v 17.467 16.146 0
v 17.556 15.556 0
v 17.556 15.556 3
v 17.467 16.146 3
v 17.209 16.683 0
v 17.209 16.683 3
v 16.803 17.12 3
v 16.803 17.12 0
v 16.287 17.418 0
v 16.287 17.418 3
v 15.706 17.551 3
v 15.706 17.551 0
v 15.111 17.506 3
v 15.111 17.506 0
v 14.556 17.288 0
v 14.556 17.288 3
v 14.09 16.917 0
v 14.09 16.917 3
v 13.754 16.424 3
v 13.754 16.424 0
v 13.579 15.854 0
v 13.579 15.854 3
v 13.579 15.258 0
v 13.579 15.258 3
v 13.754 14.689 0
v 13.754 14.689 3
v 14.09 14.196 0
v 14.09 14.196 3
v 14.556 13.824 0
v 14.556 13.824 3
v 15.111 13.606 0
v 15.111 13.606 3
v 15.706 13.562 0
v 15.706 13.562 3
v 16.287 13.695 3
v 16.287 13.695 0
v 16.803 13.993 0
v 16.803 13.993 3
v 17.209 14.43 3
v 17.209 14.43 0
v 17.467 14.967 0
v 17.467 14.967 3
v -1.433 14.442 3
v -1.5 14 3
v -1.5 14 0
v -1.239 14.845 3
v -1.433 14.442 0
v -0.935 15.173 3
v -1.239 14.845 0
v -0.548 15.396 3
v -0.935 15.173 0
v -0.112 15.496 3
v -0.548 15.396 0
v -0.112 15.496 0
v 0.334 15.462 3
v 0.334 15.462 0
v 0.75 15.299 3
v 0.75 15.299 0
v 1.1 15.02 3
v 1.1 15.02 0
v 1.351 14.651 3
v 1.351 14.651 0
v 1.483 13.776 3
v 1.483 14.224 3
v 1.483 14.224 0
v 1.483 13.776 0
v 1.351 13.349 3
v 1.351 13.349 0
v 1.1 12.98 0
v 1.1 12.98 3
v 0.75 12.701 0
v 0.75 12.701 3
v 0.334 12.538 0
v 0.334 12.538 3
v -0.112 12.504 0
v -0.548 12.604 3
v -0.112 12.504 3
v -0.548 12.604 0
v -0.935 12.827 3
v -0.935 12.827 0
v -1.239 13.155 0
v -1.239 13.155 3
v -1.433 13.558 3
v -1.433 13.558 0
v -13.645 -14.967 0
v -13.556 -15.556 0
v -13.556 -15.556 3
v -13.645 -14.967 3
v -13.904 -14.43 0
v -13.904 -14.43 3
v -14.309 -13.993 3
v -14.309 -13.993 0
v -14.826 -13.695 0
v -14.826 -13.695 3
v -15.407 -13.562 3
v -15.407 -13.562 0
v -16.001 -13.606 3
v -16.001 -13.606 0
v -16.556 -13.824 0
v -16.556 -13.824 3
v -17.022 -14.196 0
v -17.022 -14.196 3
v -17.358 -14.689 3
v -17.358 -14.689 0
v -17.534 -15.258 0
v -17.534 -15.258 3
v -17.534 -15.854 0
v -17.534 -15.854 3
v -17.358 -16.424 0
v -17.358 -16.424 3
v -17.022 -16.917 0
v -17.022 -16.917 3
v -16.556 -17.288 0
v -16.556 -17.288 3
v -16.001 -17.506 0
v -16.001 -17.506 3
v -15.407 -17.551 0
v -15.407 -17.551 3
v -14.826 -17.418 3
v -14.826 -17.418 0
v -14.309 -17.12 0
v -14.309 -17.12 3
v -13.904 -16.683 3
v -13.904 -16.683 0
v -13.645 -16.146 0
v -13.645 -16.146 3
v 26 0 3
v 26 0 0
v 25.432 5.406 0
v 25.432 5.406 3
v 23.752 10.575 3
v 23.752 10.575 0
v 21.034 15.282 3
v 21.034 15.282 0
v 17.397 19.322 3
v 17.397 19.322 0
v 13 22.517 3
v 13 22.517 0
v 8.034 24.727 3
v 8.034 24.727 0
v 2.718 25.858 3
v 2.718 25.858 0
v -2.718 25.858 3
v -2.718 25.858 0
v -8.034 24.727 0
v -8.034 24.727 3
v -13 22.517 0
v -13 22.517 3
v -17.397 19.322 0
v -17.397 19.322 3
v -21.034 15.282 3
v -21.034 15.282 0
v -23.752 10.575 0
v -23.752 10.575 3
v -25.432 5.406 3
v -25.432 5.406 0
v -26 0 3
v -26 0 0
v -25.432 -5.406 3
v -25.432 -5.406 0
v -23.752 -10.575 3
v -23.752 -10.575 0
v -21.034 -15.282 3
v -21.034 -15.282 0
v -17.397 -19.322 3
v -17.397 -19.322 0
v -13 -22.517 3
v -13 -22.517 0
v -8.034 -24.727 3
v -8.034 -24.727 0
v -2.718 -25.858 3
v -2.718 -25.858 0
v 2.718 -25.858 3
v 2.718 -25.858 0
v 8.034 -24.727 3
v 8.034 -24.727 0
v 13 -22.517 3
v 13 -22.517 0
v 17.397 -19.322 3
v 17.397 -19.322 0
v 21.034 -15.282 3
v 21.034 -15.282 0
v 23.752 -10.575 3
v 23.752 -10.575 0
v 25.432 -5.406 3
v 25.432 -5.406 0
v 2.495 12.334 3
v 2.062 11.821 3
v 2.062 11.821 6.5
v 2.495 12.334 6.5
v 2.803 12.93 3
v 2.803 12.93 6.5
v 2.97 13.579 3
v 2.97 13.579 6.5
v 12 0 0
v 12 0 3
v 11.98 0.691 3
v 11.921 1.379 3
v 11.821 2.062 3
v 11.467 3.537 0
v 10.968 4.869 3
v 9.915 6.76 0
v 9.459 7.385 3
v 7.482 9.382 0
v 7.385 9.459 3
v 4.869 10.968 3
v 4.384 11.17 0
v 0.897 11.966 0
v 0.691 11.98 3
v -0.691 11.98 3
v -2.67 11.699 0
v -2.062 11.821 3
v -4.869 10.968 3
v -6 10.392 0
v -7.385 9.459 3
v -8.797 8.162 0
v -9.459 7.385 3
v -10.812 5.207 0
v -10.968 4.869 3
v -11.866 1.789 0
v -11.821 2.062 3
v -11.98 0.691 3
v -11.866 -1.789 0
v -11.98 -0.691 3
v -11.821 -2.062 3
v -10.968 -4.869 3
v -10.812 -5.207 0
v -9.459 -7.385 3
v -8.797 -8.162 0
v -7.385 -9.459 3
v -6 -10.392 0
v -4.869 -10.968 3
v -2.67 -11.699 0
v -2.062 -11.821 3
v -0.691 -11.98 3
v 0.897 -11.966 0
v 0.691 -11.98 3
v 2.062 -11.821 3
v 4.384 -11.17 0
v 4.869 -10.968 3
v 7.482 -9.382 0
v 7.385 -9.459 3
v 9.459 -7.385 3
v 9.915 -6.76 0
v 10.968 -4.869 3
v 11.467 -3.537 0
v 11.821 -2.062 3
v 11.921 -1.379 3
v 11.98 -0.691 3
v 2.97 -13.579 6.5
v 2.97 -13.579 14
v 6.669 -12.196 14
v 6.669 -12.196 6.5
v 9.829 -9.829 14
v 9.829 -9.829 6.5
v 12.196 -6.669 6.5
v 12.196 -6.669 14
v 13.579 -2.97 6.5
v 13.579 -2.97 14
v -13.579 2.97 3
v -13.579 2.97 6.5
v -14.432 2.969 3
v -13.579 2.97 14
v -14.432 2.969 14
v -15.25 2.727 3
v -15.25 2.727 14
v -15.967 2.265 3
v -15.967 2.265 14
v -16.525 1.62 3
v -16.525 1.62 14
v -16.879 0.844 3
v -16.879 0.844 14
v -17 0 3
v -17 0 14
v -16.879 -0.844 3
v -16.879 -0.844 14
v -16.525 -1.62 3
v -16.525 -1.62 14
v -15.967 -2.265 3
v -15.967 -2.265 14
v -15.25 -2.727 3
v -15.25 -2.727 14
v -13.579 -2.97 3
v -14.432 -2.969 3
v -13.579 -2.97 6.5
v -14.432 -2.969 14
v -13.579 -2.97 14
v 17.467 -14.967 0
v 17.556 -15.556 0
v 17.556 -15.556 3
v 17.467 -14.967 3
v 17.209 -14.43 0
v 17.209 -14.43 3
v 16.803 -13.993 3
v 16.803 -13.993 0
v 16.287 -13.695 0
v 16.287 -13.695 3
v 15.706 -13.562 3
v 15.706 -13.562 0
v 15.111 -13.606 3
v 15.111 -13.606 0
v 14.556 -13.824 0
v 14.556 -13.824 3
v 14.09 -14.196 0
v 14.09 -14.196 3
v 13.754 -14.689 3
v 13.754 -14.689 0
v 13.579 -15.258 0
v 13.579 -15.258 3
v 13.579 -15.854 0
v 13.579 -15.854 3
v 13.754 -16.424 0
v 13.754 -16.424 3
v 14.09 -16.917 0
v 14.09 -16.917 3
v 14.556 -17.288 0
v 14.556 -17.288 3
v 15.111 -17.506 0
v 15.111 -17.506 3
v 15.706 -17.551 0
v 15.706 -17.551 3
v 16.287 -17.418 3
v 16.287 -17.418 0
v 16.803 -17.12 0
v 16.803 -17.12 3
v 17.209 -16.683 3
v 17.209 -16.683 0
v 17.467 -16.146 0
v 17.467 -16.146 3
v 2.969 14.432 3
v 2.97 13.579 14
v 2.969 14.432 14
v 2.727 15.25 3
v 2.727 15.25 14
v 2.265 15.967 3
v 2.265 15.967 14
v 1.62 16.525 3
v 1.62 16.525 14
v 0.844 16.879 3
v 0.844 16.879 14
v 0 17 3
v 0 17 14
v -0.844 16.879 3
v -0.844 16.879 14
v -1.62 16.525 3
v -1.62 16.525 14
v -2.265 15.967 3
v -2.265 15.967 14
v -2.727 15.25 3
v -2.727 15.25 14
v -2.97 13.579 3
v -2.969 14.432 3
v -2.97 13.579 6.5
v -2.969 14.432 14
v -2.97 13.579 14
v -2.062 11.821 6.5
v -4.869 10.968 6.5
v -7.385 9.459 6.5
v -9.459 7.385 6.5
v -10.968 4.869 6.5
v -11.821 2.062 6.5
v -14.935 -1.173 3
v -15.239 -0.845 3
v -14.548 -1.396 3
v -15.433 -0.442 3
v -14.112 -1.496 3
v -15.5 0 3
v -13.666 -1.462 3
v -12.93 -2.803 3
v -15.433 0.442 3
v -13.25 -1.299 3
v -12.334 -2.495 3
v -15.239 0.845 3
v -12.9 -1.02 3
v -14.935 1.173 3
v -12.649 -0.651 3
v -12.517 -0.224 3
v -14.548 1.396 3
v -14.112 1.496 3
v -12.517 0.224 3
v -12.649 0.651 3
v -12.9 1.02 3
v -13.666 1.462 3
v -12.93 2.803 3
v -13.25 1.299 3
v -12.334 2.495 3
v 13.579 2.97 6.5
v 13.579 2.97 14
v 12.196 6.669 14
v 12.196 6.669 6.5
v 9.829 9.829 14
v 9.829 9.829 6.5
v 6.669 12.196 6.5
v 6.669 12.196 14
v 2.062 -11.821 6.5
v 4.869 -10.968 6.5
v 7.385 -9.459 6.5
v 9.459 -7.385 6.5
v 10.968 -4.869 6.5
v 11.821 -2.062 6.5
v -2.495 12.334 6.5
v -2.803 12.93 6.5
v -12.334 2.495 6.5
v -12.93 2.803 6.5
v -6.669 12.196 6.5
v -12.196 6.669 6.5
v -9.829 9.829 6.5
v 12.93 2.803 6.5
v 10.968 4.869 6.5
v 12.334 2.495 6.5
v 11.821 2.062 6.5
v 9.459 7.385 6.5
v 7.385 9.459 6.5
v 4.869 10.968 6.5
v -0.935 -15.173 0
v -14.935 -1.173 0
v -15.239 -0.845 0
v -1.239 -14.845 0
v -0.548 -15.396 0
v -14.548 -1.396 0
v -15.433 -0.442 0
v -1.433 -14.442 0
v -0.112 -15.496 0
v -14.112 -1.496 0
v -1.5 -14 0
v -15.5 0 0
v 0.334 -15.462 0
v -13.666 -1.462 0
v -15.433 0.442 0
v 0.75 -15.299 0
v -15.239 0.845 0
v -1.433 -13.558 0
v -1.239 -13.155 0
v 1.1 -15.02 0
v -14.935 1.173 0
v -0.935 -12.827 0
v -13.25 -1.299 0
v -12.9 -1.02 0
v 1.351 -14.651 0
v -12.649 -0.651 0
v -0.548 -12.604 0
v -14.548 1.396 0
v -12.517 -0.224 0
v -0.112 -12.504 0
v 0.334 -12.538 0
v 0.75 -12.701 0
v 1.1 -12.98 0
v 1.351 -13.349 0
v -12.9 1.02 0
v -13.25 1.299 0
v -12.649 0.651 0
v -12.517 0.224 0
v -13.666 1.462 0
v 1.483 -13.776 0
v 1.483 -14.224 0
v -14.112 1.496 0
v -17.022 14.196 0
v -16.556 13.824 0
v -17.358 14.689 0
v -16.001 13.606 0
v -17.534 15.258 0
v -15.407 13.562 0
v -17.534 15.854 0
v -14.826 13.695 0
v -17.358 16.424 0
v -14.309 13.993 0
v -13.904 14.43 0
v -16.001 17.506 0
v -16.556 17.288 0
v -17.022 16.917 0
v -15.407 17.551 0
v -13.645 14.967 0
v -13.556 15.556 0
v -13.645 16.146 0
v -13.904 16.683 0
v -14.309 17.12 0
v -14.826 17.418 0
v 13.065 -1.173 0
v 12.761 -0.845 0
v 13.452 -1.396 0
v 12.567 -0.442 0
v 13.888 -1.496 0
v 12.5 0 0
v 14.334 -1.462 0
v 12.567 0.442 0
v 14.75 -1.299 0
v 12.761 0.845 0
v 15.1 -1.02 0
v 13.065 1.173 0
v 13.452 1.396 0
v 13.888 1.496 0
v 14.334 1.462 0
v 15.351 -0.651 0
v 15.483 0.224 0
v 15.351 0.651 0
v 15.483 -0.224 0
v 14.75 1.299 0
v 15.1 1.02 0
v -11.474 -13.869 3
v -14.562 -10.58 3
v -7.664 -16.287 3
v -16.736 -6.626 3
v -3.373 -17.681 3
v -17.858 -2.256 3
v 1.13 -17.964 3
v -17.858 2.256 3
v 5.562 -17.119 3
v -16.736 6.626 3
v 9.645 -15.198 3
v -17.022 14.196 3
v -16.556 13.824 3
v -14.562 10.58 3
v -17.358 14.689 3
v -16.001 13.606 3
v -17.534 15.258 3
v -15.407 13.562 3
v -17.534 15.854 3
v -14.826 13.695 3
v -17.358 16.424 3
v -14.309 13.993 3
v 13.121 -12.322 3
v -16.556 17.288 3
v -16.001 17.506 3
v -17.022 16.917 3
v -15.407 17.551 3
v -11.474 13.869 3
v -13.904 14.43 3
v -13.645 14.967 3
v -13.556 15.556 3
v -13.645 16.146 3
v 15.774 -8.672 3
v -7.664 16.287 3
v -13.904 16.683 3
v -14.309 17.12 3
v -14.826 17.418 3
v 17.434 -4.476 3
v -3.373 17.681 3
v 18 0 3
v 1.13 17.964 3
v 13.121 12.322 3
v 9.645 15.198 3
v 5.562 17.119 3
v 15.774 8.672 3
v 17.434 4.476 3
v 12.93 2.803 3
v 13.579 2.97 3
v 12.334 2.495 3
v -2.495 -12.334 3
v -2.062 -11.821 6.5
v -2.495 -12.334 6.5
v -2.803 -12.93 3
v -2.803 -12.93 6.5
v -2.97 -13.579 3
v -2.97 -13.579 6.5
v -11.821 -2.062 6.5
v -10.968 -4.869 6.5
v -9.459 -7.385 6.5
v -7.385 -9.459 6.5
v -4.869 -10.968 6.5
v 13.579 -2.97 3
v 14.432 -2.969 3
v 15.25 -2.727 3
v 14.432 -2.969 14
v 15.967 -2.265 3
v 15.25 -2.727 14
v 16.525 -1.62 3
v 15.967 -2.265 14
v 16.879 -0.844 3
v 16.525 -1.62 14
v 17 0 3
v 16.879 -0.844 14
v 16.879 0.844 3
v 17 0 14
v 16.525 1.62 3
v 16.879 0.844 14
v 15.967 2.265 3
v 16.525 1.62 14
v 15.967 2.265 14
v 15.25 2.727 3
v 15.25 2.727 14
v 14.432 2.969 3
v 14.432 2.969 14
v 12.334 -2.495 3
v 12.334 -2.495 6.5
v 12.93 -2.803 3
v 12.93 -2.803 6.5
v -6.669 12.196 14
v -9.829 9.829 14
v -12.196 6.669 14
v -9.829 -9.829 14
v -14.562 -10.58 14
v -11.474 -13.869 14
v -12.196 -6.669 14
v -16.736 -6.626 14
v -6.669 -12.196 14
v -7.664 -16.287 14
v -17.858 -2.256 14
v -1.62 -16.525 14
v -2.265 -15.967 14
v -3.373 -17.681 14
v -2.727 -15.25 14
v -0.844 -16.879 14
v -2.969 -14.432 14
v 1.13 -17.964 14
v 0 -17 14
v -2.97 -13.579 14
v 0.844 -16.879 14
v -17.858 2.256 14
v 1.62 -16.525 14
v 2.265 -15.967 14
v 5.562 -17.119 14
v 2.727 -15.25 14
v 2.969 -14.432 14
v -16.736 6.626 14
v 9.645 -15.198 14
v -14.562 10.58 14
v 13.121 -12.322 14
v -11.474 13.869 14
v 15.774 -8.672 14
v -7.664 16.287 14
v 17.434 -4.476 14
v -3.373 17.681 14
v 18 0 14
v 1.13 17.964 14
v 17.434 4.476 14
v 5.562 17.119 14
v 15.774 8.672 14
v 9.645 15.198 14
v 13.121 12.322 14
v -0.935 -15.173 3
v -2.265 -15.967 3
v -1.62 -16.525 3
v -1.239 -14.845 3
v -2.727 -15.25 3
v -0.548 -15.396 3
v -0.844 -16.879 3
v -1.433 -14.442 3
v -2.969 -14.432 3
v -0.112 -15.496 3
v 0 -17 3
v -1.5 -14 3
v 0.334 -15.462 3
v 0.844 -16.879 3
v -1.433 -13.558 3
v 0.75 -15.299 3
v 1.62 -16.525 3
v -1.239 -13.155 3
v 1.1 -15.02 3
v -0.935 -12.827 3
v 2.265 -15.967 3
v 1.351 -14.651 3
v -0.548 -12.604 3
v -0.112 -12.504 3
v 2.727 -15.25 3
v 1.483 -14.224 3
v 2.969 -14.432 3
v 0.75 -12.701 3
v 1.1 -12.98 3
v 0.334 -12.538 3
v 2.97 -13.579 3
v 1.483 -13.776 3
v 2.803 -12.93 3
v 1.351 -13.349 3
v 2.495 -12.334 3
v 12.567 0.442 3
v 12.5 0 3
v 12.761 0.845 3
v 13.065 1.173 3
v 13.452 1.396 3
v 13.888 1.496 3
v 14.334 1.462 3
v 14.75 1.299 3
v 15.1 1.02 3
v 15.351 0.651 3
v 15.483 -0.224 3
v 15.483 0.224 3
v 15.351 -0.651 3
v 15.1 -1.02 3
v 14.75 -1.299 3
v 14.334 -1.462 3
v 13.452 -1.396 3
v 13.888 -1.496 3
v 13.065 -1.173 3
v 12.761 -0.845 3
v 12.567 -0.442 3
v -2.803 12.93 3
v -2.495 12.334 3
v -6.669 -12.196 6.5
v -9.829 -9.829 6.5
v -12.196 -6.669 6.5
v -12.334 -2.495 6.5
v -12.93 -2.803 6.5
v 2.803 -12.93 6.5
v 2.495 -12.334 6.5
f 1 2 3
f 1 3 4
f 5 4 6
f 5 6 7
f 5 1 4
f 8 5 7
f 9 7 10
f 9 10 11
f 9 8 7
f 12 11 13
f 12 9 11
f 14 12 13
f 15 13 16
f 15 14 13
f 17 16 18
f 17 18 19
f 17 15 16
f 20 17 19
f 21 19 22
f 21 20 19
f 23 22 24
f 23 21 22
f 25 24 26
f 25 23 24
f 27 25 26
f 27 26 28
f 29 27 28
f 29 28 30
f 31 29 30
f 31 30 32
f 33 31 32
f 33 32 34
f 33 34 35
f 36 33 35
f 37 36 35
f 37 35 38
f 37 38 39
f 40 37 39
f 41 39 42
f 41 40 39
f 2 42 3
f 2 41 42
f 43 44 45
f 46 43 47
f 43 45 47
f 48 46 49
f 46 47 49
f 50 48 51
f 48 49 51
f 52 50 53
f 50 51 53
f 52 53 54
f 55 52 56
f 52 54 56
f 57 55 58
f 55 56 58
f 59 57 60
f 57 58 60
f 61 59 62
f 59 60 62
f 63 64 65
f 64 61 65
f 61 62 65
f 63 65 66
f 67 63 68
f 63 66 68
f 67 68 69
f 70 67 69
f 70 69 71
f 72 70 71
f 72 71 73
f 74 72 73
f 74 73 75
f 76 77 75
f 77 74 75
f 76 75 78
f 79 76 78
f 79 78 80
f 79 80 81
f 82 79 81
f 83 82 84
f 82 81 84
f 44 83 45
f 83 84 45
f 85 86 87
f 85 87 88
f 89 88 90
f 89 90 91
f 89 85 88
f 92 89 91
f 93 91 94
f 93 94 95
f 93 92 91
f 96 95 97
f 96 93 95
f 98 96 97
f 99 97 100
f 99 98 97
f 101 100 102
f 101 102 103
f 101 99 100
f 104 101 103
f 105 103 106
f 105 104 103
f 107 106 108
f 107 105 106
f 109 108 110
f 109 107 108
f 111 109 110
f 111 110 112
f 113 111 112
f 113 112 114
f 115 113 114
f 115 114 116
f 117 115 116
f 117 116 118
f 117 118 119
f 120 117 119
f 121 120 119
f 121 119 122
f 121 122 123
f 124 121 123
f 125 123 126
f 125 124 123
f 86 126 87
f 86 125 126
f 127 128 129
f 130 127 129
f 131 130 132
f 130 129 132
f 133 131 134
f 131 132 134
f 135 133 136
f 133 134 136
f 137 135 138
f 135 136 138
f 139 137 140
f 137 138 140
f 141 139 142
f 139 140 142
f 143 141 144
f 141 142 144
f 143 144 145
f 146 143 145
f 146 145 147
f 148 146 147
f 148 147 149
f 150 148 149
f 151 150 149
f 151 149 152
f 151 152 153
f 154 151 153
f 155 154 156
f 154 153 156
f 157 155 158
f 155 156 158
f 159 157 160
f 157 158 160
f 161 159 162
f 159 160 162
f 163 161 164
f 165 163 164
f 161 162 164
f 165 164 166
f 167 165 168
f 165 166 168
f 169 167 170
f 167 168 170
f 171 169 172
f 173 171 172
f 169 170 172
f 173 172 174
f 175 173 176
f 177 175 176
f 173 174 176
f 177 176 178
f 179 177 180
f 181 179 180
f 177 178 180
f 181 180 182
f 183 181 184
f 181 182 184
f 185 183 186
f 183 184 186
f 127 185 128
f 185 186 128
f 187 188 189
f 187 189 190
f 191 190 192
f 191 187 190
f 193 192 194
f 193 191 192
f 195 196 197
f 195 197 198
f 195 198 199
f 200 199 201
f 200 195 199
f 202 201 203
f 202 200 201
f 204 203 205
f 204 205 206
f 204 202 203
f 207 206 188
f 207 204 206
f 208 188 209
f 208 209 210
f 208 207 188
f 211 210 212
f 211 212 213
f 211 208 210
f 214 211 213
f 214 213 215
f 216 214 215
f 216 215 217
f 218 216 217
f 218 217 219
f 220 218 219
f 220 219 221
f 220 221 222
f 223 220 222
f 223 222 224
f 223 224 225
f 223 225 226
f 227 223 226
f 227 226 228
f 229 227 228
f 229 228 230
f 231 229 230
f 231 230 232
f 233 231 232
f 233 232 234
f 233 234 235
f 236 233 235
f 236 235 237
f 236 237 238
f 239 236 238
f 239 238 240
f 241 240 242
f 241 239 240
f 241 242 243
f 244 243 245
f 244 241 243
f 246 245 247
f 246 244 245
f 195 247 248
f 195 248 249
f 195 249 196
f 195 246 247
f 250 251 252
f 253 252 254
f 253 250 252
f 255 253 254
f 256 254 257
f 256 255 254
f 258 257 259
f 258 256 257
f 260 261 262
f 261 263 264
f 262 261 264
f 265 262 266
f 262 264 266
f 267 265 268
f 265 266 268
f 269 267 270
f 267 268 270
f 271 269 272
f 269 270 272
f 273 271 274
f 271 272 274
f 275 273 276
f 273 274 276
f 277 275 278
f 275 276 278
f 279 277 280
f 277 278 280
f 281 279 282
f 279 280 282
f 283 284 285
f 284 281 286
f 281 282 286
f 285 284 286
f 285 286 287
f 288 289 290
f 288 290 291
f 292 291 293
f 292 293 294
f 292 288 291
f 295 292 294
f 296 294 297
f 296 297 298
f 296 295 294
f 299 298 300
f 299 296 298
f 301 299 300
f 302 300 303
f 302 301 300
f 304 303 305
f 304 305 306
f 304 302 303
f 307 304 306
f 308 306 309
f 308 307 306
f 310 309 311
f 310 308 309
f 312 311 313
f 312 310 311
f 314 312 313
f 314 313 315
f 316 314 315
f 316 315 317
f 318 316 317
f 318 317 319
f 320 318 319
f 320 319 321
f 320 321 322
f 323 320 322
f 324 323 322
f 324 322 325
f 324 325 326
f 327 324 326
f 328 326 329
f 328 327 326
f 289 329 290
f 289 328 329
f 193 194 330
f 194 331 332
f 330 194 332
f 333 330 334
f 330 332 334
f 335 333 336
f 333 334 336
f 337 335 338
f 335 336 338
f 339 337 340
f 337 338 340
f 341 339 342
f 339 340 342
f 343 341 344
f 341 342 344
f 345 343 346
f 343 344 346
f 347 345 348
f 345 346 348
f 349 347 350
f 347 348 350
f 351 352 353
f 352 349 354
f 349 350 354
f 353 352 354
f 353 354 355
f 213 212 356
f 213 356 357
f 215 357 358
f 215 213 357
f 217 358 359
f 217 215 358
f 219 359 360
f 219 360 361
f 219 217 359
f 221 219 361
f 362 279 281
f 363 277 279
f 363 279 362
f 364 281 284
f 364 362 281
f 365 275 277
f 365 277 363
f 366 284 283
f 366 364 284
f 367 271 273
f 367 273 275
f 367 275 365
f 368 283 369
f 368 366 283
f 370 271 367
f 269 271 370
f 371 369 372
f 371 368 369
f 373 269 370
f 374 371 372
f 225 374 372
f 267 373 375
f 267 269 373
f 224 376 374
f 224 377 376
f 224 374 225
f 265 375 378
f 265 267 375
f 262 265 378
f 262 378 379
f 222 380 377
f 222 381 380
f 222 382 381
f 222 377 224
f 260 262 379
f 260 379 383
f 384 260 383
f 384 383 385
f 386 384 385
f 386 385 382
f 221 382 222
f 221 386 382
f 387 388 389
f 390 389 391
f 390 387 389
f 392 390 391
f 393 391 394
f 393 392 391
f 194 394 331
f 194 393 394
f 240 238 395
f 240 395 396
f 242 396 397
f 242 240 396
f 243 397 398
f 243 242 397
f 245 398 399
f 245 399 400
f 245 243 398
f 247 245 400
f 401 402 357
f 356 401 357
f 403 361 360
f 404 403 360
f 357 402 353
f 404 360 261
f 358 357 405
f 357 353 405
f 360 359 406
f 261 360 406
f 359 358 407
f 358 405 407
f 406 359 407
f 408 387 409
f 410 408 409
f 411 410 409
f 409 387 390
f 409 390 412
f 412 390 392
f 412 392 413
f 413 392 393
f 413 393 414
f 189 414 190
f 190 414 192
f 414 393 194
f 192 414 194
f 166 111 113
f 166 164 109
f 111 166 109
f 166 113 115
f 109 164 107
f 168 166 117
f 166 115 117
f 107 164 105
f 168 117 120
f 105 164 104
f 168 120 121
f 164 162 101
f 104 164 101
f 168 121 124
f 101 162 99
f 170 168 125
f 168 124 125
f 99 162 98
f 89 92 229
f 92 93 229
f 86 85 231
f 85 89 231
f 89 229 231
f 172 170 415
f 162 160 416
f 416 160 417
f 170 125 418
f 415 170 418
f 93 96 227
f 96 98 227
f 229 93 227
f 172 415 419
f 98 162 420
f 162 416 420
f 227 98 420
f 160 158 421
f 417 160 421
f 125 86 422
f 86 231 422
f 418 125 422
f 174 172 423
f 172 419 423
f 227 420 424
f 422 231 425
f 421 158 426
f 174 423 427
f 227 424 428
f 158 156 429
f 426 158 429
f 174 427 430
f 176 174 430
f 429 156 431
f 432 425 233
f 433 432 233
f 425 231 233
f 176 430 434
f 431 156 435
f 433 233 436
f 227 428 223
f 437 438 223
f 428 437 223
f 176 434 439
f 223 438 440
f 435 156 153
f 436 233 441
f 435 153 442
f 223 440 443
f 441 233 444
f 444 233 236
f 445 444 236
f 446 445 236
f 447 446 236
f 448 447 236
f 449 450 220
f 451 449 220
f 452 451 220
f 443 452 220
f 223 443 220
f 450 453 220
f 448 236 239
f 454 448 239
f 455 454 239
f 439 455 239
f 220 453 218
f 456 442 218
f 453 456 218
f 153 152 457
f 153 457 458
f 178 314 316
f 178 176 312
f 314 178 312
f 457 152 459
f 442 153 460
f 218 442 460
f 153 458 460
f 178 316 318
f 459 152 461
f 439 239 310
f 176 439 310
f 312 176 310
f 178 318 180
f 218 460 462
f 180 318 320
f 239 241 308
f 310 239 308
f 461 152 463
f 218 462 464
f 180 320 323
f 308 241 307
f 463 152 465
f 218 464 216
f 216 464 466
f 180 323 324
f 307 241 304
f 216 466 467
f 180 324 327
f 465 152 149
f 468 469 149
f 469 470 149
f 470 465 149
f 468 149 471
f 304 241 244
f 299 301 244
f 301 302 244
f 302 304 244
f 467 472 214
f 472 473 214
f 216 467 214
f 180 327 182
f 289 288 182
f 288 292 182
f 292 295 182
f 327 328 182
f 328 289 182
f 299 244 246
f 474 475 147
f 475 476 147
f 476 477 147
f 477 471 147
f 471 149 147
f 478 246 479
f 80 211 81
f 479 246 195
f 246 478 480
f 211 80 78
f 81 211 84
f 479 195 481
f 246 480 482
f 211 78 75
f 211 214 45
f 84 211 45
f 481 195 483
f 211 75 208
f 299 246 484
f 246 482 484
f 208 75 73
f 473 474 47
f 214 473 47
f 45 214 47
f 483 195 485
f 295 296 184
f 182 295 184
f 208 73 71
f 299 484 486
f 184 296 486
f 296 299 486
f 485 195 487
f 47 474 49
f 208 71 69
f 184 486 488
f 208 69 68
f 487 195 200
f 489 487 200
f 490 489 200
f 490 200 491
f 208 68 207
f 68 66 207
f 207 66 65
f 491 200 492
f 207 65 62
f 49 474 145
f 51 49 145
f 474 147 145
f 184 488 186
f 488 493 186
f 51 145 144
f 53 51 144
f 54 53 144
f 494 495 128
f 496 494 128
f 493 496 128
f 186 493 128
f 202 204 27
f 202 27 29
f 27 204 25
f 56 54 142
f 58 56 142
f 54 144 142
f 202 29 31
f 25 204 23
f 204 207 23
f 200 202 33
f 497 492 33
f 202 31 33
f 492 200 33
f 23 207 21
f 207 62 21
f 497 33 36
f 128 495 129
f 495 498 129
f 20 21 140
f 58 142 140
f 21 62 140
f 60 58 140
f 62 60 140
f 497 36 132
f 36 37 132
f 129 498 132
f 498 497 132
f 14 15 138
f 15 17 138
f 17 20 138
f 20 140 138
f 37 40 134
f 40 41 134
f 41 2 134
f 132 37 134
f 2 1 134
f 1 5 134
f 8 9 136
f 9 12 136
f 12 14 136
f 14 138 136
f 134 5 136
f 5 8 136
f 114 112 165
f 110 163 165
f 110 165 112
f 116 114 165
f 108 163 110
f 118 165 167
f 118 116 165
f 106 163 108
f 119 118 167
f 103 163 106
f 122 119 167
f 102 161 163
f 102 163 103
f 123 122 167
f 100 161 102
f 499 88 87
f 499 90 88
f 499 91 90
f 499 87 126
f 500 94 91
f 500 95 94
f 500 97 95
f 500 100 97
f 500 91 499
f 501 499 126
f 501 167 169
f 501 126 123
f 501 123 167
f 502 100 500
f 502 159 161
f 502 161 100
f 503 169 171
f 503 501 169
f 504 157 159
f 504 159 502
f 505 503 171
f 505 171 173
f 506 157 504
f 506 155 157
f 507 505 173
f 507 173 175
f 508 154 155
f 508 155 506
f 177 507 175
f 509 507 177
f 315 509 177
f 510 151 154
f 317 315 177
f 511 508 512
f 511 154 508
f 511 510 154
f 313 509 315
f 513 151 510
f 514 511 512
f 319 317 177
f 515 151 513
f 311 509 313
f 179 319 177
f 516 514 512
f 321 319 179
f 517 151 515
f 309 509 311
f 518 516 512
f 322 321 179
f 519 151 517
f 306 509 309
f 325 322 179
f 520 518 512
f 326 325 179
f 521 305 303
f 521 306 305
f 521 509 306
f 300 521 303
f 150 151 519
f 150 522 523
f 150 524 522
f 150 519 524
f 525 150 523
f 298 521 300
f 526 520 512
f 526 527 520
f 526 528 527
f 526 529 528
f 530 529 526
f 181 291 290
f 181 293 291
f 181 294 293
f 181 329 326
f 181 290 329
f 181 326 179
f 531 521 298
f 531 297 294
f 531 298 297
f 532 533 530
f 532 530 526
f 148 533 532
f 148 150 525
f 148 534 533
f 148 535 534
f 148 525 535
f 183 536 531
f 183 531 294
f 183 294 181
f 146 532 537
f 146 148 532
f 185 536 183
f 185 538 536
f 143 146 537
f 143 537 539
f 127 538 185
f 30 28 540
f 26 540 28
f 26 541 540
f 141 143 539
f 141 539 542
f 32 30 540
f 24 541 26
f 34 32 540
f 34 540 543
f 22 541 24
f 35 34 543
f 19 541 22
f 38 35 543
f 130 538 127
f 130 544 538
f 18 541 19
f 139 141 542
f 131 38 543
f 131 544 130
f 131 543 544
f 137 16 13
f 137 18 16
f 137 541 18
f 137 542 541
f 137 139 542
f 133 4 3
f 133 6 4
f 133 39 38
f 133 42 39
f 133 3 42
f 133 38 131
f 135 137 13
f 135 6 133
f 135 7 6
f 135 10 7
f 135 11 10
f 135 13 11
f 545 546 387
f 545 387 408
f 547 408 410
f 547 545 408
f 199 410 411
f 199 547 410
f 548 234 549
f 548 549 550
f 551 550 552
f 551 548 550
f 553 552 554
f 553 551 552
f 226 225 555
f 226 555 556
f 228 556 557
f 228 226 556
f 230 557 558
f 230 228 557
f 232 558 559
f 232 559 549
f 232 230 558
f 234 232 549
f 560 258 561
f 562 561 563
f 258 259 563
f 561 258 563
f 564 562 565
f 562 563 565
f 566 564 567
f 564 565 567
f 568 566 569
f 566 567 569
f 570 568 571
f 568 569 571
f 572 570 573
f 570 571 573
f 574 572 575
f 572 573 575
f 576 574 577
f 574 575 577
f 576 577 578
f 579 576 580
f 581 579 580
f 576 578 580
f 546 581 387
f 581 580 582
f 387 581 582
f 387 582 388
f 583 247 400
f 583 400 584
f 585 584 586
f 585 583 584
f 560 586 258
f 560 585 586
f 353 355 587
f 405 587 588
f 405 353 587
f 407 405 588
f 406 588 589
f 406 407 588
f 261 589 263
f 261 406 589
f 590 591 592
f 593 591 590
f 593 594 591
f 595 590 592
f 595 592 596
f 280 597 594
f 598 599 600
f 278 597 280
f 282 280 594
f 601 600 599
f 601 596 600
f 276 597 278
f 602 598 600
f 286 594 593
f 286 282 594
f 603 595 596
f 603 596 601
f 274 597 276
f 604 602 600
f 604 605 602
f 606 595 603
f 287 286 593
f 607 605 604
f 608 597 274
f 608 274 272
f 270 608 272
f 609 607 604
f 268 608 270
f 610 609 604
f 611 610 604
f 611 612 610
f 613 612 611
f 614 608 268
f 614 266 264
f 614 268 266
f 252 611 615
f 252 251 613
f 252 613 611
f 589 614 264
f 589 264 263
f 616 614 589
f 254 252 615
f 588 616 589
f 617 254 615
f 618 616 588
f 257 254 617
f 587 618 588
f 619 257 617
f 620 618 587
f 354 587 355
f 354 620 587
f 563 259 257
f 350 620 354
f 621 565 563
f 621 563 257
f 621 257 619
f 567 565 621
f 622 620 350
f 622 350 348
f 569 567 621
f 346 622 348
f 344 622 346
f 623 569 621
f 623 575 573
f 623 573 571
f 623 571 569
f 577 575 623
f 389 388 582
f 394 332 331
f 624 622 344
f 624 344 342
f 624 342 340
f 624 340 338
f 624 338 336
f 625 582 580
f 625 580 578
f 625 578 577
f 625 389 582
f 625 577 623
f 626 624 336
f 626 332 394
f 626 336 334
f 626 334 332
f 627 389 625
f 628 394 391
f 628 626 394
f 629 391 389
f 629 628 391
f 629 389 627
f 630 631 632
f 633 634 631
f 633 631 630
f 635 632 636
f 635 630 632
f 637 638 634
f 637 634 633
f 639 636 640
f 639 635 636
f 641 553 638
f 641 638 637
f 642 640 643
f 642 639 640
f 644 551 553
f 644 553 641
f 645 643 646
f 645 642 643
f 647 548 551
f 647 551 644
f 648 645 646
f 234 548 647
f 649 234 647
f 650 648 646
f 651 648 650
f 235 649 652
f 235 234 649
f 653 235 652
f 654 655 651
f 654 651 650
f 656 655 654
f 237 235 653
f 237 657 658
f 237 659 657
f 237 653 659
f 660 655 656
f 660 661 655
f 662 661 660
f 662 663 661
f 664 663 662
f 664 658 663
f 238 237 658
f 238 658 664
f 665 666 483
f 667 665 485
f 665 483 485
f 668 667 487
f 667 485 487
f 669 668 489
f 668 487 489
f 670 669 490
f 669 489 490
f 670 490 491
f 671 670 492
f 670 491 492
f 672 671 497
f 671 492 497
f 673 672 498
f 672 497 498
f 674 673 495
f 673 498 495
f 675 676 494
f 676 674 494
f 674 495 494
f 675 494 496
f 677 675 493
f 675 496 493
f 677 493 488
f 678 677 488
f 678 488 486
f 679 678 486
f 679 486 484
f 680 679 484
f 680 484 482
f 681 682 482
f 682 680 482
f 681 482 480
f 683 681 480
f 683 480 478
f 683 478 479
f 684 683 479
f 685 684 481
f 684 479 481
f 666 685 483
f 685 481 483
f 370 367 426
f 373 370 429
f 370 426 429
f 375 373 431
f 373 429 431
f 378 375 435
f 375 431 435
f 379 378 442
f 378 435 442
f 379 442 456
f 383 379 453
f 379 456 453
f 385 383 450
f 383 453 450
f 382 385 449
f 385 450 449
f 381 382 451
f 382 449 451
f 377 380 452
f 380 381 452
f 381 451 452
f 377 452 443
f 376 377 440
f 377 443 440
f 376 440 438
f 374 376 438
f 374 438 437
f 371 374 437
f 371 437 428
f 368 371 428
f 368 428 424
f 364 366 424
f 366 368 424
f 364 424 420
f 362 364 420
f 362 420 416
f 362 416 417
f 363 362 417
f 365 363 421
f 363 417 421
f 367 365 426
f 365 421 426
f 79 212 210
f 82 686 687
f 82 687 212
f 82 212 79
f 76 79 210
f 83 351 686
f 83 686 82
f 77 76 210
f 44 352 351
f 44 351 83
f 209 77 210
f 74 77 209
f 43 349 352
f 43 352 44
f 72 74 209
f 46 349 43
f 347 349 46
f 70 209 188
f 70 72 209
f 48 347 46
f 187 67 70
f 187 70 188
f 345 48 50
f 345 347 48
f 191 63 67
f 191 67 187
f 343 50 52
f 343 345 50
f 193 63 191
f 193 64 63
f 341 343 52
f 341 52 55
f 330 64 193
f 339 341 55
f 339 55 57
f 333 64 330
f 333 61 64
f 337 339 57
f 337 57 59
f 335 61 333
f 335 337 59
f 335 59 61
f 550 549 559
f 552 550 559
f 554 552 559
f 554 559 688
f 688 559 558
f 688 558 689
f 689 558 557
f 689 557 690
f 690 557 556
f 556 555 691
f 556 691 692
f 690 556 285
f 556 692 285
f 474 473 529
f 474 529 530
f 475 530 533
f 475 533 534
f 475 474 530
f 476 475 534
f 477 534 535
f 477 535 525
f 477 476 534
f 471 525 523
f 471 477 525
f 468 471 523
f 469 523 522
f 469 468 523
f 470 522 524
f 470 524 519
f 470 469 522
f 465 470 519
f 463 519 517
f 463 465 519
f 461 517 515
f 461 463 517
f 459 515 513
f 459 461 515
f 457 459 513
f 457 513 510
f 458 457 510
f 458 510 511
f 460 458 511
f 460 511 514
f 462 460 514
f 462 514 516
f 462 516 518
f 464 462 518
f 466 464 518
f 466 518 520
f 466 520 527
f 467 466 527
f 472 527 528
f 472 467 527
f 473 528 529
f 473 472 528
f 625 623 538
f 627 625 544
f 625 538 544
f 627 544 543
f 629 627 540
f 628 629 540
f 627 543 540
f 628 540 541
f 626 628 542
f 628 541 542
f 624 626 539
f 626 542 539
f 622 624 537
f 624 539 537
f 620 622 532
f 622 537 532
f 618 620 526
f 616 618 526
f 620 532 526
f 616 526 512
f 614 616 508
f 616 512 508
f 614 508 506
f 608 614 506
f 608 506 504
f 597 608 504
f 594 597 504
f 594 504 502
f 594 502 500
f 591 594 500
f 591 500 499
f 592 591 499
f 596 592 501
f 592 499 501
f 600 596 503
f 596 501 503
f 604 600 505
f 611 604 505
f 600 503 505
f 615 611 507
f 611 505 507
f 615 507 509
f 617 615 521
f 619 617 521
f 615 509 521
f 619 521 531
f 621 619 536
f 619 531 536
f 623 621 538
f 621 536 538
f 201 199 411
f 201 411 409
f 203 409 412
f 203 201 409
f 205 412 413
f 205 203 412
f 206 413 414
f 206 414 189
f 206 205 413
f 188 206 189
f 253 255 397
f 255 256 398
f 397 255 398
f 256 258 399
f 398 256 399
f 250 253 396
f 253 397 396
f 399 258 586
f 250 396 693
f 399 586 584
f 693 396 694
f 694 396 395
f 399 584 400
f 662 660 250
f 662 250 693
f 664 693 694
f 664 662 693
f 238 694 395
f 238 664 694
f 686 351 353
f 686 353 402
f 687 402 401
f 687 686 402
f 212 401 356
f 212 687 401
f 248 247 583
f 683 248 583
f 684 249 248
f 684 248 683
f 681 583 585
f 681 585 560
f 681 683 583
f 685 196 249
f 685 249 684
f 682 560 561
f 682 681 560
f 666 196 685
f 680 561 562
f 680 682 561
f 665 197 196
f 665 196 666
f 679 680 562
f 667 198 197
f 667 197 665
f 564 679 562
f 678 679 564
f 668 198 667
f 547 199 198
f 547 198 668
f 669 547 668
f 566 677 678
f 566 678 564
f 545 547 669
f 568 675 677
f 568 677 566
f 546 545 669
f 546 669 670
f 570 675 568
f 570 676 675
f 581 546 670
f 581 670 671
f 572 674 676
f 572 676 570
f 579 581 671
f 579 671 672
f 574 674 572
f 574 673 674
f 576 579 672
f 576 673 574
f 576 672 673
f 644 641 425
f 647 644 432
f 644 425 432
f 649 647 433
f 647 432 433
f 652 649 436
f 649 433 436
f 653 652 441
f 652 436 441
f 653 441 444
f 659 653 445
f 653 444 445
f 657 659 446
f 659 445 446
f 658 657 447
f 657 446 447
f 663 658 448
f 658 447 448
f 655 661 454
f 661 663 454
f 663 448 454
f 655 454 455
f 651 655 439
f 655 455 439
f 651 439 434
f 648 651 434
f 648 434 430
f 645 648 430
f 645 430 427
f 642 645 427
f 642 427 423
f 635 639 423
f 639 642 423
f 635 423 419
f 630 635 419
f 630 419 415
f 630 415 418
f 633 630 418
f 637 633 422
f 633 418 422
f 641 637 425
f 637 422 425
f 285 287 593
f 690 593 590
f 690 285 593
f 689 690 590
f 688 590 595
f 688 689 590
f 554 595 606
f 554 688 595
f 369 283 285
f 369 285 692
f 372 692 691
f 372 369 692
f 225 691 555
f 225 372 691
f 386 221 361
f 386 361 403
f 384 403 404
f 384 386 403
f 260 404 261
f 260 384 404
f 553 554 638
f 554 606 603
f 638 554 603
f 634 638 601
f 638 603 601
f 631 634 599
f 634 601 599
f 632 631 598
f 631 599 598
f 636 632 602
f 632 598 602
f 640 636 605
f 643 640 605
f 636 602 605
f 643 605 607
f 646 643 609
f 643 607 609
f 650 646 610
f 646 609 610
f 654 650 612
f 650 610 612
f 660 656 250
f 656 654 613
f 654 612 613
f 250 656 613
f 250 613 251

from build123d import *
from build123d.topology import SkipClean

# Parameters (mm, degrees)
SKETCH_1_R          = 26
SKETCH_1_R_2        = 12
SKETCH_1_R_3        = 2
EXTRUDE_1_DEPTH     = 3
SKETCH_2_R          = 18
SKETCH_2_R_2        = 13.9
EXTRUDE_2_DEPTH     = 11
SKETCH_3_R          = 1.5
CUT_EXTRUDE_1_DEPTH = 40.344631146
SKETCH_4_R          = 3
CUT_EXTRUDE_5_DEPTH = 11
EXTRUDE_3_DEPTH     = 3.5


with BuildPart() as part:
    # 草图1 → 凸台-拉伸1 (new body)
    with BuildSketch(Plane.XY):
        Circle(SKETCH_1_R)
        Circle(SKETCH_1_R_2, mode=Mode.SUBTRACT)
        with Locations((-15.556349186, 15.556349186)):
            Circle(SKETCH_1_R_3, mode=Mode.SUBTRACT)
        with Locations((15.556349186, 15.556349186)):
            Circle(SKETCH_1_R_3, mode=Mode.SUBTRACT)
        with Locations((15.556349186, -15.556349186)):
            Circle(SKETCH_1_R_3, mode=Mode.SUBTRACT)
        with Locations((-15.556349186, -15.556349186)):
            Circle(SKETCH_1_R_3, mode=Mode.SUBTRACT)
    extrude(amount=EXTRUDE_1_DEPTH)

    # 草图2 → 凸台-拉伸2 (add)
    with BuildSketch(Plane.XY.offset(3)):
        Circle(SKETCH_2_R)
        Circle(SKETCH_2_R_2, mode=Mode.SUBTRACT)
    extrude(amount=EXTRUDE_2_DEPTH)

    # 草图3 → 切除-拉伸1 (cut, through all)
    with BuildSketch(Plane(origin=(0, 0, 0), x_dir=(-1, 0, 0), z_dir=(0, 0, -1))):
        with Locations((0, 14)):
            Circle(SKETCH_3_R)
        with Locations((14, 0)):
            Circle(SKETCH_3_R)
        with Locations((0, -14)):
            Circle(SKETCH_3_R)
        with Locations((-14, 0)):
            Circle(SKETCH_3_R)
    extrude(amount=-CUT_EXTRUDE_1_DEPTH, mode=Mode.SUBTRACT)

    # 草图4 → 切除-拉伸5 (cut)
    with BuildSketch(Plane.XY.offset(14)):
        with Locations((0, 14)):
            Circle(SKETCH_4_R)
        with Locations((14, 0)):
            Circle(SKETCH_4_R)
        with Locations((0, -14)):
            Circle(SKETCH_4_R)
        with Locations((-14, 0)):
            Circle(SKETCH_4_R)
    extrude(amount=-CUT_EXTRUDE_5_DEPTH, mode=Mode.SUBTRACT)

    # 草图5 → 凸台-拉伸3 (add)
    with SkipClean():  # the faces are left unmerged after this step: merging them gives an invalid solid
        with BuildSketch(Plane.XY.offset(3)):
            with BuildLine():
                ThreePointArc((-13.578928571, -2.970302822), (-12.623202626, -2.665413475), (-11.821428571, -2.062480674))
                ThreePointArc((-11.821428571, -2.062480674), (-8.485281374, -8.485281374), (-2.062480674, -11.821428571))
                ThreePointArc((-2.062480674, -11.821428571), (-2.665413475, -12.623202626), (-2.970302822, -13.578928571))
                ThreePointArc((-2.970302822, -13.578928571), (-9.828784258, -9.828784258), (-13.578928571, -2.970302822))
            make_face()
            with BuildLine():
                ThreePointArc((-2.970302822, 13.578928571), (-2.665413475, 12.623202626), (-2.062480674, 11.821428571))
                ThreePointArc((-2.062480674, 11.821428571), (-8.485281374, 8.485281374), (-11.821428571, 2.062480674))
                ThreePointArc((-11.821428571, 2.062480674), (-12.623202626, 2.665413475), (-13.578928571, 2.970302822))
                ThreePointArc((-13.578928571, 2.970302822), (-9.828784258, 9.828784258), (-2.970302822, 13.578928571))
            make_face()
            with BuildLine():
                ThreePointArc((13.578928571, 2.970302822), (12.623202626, 2.665413475), (11.821428571, 2.062480674))
                ThreePointArc((11.821428571, 2.062480674), (8.485281374, 8.485281374), (2.062480674, 11.821428571))
                ThreePointArc((2.062480674, 11.821428571), (2.665413475, 12.623202626), (2.970302822, 13.578928571))
                ThreePointArc((2.970302822, 13.578928571), (9.828784258, 9.828784258), (13.578928571, 2.970302822))
            make_face()
            with BuildLine():
                ThreePointArc((2.970302822, -13.578928571), (2.665413475, -12.623202626), (2.062480674, -11.821428571))
                ThreePointArc((2.062480674, -11.821428571), (8.485281374, -8.485281374), (11.821428571, -2.062480674))
                ThreePointArc((11.821428571, -2.062480674), (12.623202626, -2.665413475), (13.578928571, -2.970302822))
                ThreePointArc((13.578928571, -2.970302822), (9.828784258, -9.828784258), (2.970302822, -13.578928571))
            make_face()
        extrude(amount=EXTRUDE_3_DEPTH)


solid = part.part
